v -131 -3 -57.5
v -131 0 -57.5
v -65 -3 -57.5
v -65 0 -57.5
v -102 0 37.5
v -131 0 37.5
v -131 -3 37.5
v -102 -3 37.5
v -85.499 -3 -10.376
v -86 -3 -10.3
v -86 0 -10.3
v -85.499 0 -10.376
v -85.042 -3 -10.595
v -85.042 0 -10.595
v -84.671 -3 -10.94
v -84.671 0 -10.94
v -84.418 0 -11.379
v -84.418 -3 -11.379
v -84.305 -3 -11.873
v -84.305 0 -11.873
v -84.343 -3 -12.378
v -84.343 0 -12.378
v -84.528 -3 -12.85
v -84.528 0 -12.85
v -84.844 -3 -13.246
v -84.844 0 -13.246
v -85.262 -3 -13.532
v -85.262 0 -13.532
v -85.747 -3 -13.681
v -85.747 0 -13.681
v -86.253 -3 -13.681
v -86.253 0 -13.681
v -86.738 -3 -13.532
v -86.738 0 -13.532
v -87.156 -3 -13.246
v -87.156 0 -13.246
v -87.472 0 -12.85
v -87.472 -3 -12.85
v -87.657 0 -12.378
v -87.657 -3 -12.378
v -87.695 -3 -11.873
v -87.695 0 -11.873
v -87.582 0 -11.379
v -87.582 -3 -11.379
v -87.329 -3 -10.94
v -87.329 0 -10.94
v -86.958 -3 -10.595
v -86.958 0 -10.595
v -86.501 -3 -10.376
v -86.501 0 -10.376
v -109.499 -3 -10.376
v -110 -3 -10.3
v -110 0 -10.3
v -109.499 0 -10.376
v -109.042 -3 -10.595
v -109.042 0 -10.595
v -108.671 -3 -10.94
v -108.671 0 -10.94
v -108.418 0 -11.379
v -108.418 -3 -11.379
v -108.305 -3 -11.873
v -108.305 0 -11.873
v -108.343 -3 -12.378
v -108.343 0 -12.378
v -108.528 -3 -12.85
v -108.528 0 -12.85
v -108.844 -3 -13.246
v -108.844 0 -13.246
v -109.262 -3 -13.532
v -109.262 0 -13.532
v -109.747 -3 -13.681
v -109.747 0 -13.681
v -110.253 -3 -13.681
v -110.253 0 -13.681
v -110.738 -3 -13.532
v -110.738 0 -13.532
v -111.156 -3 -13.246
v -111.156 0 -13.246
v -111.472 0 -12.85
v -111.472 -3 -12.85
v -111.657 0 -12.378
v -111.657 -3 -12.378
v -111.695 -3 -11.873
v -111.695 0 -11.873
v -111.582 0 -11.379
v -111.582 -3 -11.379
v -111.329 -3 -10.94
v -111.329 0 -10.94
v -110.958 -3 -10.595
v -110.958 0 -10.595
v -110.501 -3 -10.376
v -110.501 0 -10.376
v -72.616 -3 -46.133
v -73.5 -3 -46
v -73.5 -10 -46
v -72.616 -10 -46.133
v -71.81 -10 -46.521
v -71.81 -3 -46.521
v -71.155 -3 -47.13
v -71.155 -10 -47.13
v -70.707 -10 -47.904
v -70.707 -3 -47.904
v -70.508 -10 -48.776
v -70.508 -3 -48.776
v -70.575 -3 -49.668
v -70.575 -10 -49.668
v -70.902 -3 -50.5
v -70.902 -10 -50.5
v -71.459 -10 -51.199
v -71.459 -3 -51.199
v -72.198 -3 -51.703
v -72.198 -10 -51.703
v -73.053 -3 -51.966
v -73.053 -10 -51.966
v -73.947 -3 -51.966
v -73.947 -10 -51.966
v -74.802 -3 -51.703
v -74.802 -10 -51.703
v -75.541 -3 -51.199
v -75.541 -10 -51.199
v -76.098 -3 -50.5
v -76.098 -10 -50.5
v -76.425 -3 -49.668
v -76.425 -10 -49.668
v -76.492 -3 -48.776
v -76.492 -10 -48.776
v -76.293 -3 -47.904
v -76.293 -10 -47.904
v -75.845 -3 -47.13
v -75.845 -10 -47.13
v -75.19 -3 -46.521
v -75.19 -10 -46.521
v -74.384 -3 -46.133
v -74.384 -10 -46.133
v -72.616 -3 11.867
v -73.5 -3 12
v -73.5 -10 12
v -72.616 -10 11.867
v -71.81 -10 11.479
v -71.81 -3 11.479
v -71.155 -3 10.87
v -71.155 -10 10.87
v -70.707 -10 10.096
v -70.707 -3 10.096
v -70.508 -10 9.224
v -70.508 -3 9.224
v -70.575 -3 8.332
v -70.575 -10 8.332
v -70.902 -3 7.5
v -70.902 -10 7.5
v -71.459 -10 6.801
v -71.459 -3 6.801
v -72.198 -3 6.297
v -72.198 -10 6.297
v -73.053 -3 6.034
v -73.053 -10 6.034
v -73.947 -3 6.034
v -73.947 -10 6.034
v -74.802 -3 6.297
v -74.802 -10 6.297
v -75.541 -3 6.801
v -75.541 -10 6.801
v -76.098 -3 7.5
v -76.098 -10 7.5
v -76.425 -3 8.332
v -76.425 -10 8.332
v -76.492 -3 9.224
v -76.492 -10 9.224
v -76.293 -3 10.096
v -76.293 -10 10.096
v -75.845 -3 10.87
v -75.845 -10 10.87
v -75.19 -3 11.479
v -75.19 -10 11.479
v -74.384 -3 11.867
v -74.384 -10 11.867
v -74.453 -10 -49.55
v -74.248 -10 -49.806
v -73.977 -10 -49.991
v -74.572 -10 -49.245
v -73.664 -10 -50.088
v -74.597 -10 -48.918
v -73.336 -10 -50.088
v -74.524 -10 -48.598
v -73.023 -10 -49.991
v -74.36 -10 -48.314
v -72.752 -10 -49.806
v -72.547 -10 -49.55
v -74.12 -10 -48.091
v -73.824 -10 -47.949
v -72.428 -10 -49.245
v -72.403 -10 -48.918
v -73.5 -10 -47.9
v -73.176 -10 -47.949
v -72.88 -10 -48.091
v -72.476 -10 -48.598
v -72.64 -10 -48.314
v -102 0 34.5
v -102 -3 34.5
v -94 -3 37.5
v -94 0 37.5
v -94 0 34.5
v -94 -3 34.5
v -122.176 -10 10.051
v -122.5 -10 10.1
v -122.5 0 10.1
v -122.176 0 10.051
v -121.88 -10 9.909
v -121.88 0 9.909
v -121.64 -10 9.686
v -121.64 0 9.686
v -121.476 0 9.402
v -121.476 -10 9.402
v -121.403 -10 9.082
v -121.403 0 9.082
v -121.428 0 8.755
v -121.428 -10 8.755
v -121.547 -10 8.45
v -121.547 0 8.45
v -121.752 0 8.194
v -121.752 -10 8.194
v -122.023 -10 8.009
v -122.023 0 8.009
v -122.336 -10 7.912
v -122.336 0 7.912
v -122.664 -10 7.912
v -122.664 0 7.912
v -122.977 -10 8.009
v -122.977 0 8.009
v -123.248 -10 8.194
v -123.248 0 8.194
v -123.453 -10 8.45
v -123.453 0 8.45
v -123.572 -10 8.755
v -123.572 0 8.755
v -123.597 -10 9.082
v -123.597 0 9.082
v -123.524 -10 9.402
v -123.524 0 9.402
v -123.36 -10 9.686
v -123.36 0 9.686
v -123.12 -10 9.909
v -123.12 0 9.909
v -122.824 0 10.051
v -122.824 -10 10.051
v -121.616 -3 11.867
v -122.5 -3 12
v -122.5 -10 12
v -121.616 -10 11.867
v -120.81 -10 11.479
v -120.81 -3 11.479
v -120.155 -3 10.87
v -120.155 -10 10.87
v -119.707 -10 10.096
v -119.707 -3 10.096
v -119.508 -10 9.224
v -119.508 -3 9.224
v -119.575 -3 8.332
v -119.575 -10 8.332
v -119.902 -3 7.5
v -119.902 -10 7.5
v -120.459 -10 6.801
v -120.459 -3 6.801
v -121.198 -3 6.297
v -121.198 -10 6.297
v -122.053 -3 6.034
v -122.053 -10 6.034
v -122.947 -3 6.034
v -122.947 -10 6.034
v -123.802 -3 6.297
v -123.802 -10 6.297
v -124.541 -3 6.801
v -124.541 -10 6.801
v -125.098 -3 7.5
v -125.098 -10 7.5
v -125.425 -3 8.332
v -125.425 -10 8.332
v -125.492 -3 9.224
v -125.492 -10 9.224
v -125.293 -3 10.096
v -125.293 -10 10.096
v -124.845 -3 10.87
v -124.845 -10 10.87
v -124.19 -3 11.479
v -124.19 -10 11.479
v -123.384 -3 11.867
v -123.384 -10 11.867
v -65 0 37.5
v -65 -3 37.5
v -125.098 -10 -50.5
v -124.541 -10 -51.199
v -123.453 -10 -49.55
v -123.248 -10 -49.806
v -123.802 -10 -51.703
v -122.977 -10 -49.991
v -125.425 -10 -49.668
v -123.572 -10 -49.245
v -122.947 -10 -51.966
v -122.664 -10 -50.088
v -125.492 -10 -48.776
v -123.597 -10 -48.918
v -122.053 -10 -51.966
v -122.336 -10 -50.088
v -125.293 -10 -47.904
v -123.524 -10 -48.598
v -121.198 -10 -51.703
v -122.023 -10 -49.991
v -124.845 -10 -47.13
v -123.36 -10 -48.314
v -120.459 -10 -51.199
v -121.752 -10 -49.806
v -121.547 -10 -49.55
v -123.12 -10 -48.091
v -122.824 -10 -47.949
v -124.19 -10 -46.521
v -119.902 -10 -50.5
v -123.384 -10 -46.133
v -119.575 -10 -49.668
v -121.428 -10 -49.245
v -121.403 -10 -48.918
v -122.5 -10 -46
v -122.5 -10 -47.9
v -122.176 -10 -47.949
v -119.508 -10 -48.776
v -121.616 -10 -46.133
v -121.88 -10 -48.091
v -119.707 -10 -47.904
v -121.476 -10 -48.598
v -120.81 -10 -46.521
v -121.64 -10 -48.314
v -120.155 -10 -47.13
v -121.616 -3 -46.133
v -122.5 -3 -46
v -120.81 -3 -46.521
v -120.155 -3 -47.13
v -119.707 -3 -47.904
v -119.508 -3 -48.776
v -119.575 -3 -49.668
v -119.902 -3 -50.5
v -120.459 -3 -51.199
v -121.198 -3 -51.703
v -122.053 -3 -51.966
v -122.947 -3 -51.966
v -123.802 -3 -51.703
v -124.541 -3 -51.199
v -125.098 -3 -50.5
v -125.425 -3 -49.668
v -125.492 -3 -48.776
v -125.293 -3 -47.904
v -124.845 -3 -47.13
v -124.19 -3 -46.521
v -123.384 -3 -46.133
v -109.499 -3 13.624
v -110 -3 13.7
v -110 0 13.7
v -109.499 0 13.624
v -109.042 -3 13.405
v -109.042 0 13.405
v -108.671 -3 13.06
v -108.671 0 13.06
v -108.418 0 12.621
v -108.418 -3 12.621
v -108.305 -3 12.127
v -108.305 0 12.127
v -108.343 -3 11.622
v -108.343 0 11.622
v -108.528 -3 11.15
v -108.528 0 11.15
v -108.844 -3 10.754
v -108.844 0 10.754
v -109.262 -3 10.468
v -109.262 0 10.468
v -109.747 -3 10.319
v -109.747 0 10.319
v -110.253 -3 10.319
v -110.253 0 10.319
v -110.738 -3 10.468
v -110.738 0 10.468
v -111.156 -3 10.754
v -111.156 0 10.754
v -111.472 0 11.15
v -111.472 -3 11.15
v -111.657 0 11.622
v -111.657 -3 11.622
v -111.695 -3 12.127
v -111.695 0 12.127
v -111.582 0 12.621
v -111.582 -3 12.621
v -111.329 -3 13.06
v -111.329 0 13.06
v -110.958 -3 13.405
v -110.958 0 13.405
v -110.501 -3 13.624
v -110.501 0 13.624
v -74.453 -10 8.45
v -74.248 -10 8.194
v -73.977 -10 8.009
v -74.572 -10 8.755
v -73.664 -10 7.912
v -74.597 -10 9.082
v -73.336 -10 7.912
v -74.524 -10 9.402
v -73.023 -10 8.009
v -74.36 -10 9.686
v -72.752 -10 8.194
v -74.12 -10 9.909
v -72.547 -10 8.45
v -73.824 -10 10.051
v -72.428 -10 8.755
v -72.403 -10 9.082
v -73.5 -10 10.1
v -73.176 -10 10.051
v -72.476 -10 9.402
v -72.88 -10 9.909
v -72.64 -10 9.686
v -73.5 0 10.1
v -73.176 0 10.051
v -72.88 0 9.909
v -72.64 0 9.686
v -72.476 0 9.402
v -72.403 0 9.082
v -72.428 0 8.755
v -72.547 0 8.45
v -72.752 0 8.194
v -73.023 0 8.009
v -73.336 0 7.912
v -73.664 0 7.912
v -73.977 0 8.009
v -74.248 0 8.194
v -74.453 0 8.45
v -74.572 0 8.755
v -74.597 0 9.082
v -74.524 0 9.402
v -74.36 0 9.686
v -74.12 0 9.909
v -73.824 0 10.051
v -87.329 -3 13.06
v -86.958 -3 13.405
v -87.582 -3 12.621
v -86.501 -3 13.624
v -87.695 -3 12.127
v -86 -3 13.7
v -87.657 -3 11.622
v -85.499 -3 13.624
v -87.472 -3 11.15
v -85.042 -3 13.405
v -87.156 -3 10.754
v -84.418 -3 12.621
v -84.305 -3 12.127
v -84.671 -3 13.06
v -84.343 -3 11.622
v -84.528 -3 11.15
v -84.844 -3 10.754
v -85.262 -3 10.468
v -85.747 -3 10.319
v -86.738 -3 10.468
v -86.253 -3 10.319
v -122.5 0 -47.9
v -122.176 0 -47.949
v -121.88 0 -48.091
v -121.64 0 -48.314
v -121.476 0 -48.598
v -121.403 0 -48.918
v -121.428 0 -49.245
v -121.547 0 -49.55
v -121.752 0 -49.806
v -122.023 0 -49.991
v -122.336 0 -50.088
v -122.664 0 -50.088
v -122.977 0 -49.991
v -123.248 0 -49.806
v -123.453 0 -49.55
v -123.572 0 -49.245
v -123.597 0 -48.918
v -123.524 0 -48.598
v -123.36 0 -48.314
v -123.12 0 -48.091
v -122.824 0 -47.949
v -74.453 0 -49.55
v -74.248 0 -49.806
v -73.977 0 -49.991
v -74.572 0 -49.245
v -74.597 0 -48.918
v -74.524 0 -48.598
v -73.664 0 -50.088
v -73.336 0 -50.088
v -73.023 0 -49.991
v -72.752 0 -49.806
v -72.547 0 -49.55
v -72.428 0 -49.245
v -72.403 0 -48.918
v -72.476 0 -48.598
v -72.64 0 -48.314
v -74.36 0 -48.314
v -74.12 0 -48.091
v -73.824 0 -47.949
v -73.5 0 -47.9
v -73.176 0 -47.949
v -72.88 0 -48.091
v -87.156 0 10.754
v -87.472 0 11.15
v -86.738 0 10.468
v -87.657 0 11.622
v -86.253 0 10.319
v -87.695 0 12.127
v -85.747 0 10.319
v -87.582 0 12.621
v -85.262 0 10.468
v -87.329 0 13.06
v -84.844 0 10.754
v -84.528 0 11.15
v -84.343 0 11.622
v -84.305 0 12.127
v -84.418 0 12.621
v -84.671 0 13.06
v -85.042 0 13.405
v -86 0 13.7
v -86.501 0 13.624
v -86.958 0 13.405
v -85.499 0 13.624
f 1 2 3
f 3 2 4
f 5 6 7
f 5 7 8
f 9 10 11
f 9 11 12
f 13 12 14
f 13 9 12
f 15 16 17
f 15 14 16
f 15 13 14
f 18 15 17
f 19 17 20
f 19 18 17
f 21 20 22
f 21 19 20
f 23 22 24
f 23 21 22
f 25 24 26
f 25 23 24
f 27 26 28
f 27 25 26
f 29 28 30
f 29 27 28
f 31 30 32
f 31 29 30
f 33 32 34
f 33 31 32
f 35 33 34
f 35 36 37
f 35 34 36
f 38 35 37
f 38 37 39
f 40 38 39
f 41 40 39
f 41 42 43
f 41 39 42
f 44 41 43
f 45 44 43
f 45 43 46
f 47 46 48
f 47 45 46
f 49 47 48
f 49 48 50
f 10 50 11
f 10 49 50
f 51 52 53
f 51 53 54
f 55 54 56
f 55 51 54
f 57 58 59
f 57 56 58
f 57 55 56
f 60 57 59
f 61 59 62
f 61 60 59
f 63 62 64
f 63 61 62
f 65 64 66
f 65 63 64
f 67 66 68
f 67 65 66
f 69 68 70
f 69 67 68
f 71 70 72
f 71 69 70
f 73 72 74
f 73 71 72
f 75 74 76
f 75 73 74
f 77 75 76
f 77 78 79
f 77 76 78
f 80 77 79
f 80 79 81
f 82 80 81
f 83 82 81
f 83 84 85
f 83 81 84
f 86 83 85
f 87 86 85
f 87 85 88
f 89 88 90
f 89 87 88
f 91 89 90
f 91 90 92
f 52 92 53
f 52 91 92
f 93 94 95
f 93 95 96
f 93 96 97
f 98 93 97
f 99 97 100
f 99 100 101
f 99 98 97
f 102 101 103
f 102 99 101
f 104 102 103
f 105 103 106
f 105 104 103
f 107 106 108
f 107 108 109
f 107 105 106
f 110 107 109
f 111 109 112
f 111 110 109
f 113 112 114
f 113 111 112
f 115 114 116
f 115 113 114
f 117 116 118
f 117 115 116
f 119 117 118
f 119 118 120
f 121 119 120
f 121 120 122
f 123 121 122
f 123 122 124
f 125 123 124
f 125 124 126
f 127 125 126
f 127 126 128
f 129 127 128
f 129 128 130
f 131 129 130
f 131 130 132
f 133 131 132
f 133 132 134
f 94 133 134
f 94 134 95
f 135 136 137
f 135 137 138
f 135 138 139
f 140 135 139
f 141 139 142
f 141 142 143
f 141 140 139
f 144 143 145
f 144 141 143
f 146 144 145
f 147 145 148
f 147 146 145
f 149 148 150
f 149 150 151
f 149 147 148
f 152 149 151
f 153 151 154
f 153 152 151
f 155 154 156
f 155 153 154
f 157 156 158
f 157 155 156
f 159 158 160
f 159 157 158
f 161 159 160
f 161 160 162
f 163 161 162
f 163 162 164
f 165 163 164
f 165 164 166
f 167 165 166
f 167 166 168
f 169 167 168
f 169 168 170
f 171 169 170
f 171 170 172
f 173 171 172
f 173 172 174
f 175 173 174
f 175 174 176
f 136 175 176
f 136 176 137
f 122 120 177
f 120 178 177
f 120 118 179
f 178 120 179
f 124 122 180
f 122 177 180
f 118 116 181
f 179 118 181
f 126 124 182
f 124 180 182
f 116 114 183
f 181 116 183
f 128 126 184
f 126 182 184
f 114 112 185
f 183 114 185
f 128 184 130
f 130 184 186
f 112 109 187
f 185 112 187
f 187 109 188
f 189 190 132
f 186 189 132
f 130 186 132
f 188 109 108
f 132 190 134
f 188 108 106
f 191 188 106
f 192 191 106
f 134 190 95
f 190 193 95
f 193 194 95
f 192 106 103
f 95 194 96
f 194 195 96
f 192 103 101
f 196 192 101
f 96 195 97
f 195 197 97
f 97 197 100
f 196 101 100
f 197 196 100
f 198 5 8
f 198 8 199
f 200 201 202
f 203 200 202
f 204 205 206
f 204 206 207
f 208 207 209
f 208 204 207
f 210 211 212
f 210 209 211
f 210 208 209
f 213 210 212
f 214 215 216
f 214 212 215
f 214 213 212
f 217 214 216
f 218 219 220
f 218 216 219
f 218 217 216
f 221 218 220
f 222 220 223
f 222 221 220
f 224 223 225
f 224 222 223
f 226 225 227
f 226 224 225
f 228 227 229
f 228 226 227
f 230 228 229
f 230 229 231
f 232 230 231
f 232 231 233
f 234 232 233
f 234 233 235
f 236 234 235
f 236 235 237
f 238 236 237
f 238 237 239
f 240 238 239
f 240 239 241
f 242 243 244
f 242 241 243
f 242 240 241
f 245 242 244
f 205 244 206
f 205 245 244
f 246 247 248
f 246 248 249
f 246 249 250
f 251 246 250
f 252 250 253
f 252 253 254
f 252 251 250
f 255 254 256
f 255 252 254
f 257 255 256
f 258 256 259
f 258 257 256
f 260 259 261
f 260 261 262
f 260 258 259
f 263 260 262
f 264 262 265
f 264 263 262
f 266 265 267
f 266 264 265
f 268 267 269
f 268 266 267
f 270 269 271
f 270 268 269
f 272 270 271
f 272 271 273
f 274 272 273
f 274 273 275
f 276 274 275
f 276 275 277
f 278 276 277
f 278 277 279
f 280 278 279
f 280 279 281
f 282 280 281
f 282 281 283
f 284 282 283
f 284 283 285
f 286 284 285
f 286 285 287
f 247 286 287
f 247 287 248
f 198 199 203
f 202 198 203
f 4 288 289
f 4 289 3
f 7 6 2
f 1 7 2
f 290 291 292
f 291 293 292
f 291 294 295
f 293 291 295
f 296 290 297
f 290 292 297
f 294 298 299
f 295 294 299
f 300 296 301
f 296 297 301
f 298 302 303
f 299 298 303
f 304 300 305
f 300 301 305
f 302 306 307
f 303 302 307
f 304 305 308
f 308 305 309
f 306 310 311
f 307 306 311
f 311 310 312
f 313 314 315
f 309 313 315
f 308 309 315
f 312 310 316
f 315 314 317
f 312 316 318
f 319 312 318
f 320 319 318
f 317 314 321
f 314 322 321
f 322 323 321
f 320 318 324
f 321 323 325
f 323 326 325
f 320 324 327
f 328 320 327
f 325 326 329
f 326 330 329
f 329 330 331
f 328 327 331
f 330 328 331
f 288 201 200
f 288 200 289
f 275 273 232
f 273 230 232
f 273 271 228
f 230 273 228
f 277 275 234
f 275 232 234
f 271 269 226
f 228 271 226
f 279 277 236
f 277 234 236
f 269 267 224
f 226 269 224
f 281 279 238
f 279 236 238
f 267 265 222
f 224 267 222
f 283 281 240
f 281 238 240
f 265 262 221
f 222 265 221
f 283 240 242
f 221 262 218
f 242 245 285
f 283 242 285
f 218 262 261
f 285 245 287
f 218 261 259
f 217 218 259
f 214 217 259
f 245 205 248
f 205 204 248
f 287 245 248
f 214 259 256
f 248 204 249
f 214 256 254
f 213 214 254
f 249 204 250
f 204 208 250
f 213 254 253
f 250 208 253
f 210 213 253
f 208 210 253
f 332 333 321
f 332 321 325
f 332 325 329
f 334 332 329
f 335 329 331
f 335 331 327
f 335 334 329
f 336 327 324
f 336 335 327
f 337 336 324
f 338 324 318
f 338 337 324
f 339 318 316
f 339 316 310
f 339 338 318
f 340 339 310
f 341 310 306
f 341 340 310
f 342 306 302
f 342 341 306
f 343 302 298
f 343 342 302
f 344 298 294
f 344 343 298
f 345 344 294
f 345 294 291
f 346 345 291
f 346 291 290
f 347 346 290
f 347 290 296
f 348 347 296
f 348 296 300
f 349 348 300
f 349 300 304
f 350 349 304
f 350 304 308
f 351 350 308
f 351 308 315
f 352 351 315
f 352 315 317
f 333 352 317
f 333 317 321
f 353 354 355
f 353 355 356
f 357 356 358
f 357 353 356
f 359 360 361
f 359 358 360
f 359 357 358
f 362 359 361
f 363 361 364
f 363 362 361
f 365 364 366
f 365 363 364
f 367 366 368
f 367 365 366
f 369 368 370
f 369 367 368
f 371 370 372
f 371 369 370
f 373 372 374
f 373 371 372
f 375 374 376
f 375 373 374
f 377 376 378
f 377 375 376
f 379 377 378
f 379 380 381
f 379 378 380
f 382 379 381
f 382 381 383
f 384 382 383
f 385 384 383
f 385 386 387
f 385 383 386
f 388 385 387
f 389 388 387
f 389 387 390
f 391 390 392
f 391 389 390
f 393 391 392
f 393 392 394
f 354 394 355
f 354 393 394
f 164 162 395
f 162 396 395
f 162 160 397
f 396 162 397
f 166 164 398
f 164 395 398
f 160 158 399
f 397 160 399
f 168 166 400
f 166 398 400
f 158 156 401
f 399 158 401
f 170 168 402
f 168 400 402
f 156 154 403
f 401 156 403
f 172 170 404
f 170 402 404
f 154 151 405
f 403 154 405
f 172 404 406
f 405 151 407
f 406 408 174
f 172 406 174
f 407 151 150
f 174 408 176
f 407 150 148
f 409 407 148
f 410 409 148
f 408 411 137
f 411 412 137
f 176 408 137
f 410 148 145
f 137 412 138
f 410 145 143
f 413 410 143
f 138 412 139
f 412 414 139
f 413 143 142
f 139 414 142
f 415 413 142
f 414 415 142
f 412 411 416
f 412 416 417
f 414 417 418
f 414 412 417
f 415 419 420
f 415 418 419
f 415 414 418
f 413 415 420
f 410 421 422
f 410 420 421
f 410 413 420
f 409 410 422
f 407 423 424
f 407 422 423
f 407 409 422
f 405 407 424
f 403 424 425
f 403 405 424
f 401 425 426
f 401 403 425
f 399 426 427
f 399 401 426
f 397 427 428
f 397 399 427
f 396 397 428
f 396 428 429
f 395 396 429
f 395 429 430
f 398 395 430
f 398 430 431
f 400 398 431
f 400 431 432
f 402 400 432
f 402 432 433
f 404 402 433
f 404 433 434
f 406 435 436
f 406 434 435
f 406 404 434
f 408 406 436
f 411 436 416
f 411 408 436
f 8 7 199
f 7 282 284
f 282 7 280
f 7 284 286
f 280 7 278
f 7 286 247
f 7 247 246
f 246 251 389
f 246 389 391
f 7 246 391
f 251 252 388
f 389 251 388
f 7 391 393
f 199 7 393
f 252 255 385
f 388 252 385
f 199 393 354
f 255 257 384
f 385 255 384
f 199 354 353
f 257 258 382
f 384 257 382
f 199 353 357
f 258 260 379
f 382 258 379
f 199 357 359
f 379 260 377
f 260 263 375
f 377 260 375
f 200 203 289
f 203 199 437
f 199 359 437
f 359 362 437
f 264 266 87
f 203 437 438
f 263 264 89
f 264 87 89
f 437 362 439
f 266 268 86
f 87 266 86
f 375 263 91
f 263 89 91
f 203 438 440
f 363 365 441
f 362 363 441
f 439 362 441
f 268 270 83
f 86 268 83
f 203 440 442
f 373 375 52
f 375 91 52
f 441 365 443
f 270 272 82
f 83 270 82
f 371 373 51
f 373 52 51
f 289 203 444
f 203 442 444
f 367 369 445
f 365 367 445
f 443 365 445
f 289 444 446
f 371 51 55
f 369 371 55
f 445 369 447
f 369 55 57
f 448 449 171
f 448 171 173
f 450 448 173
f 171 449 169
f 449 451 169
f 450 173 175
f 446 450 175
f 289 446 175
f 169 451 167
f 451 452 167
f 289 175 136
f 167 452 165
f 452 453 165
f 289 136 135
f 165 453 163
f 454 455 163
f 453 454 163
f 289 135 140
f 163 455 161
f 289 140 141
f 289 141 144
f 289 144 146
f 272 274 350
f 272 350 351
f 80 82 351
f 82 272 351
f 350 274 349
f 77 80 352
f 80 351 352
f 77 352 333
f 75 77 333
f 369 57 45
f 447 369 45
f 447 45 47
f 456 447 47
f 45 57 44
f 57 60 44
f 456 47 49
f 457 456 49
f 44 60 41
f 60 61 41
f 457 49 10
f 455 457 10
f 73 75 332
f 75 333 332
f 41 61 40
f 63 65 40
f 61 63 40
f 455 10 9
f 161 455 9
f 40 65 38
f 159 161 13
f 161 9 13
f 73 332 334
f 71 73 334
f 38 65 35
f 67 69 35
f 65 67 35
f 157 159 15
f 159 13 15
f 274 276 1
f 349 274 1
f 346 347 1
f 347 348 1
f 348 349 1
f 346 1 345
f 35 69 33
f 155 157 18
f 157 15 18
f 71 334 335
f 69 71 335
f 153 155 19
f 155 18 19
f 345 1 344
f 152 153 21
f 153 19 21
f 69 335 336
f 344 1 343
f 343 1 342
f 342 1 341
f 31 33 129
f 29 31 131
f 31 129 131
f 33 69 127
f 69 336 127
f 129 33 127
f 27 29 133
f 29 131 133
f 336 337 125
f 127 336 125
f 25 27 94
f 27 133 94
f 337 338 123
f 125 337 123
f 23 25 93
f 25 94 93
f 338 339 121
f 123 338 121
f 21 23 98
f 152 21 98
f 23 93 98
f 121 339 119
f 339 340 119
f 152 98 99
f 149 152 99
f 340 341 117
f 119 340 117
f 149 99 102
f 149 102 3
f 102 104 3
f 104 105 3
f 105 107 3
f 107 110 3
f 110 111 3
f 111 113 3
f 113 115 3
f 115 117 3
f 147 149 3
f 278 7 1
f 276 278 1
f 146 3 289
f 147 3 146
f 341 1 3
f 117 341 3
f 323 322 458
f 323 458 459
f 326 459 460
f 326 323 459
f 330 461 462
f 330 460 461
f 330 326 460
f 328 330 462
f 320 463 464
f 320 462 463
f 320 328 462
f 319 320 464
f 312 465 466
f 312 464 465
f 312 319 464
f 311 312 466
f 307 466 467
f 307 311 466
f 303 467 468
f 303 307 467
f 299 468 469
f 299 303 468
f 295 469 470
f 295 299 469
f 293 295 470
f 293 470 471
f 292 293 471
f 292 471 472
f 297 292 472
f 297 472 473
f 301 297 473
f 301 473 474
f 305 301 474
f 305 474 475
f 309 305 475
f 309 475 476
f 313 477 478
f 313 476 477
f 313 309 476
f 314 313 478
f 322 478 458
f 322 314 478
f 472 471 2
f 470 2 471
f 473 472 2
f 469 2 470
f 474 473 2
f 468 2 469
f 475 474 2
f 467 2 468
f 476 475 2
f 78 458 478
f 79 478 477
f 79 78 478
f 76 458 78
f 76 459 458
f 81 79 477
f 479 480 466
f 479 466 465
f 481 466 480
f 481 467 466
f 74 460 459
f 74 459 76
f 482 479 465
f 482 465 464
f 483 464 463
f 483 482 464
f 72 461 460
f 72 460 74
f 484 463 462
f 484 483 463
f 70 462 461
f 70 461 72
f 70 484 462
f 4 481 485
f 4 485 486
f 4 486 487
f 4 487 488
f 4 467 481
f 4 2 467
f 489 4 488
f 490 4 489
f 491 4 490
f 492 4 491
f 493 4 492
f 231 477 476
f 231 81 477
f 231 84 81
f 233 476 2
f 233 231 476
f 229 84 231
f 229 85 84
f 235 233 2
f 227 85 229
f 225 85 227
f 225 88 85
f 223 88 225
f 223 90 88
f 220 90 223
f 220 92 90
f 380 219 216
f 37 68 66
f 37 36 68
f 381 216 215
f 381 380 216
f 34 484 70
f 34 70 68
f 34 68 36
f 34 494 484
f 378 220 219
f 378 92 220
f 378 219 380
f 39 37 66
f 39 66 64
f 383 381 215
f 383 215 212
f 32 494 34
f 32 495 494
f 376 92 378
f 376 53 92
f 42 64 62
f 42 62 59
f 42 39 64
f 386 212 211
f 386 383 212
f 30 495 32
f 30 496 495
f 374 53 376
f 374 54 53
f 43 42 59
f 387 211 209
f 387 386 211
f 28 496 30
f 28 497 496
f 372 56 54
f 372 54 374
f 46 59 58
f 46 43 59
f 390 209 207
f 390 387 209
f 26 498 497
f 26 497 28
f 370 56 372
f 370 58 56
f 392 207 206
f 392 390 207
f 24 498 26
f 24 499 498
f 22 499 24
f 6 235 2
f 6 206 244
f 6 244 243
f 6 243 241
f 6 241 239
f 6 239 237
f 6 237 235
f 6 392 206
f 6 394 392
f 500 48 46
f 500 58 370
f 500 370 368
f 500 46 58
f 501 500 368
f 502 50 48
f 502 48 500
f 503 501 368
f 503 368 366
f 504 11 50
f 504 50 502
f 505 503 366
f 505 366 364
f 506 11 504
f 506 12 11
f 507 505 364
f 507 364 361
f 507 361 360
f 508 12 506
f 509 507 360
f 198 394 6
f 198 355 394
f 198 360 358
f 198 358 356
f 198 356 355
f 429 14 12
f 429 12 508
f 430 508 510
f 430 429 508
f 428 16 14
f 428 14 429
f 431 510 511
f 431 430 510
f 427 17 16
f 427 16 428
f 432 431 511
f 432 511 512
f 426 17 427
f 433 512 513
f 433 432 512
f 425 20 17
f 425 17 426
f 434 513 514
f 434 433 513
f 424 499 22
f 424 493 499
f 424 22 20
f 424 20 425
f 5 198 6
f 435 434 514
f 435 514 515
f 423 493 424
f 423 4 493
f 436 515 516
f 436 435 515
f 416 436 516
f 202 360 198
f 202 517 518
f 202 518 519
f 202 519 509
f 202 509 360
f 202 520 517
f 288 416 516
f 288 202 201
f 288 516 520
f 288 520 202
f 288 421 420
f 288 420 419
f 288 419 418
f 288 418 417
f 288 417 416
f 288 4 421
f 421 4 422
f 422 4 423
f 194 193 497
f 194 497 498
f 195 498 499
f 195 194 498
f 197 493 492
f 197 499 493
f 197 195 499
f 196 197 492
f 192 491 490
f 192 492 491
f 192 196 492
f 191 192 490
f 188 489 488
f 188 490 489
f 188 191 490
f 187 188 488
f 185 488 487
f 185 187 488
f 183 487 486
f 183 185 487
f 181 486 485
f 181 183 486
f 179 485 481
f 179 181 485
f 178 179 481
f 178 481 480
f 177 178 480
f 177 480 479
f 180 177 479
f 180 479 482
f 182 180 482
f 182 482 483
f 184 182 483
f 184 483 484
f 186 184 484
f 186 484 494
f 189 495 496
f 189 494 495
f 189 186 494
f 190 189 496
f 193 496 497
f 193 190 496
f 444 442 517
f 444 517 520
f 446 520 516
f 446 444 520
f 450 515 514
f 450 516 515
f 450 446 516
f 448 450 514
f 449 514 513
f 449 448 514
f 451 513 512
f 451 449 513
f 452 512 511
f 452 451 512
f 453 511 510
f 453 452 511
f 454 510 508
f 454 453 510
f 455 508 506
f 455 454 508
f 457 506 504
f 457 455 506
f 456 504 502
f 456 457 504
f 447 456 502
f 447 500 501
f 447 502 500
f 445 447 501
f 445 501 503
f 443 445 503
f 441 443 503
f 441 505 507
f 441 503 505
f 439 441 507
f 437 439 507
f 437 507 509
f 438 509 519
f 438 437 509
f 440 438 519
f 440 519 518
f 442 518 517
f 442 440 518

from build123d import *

# Parameters (mm, degrees)
SKETCH1_W                       = 66
SKETCH1_H                       = 95
CRADLE_BASE_DEPTH               = 3
SKETCH2_R                       = 3
STANDOFFS_DEPTH                 = 10
PILOT_AND_BOLT_HOLES_DEPTH      = 144.412865532
PILOT_AND_BOLT_HOLES_DEPTH_BACK = 144.412865532
SKETCH3_R                       = 1.1
SKETCH3_R_2                     = 1.7
USB_END_NOTCH_DEPTH             = 144.412865532
USB_END_NOTCH_DEPTH_BACK        = 144.412865532
SKETCH4_W                       = 8
SKETCH4_H                       = 4


with BuildPart() as part:
    # Sketch1 → Cradle Base (new body)
    with BuildSketch(Plane(origin=(0, 0, 0), x_dir=(1, 0, 0), z_dir=(0, 1, 0))):
        with Locations((-98, 10)):
            Rectangle(SKETCH1_W, SKETCH1_H)
    extrude(amount=-CRADLE_BASE_DEPTH)

    # Sketch2 → Standoffs (add)
    with BuildSketch(Plane(origin=(0, 0, 0), x_dir=(1, 0, 0), z_dir=(0, 1, 0))):
        with Locations(Location((-122.5, 49, 0), (0, 0, 270))):
            Circle(SKETCH2_R)
        with Locations(Location((-122.5, -9, 0), (0, 0, 270))):
            Circle(SKETCH2_R)
        with Locations(Location((-73.5, 49, 0), (0, 0, 270))):
            Circle(SKETCH2_R)
        with Locations(Location((-73.5, -9, 0), (0, 0, 270))):
            Circle(SKETCH2_R)
    extrude(amount=-STANDOFFS_DEPTH)

    # Sketch3 → Pilot and Bolt Holes (cut, two sides: drawn at the far end of the back side and taken through both)
    with BuildSketch(Plane(origin=(0, 0, 0), x_dir=(1, 0, 0), z_dir=(0, 1, 0)).offset(-PILOT_AND_BOLT_HOLES_DEPTH_BACK)):
        with Locations(Location((-122.5, 49, 0), (0, 0, 270))):
            Circle(SKETCH3_R)
        with Locations(Location((-122.5, -9, 0), (0, 0, 270))):
            Circle(SKETCH3_R)
        with Locations(Location((-73.5, 49, 0), (0, 0, 270))):
            Circle(SKETCH3_R)
        with Locations(Location((-73.5, -9, 0), (0, 0, 270))):
            Circle(SKETCH3_R)
        with Locations(Location((-110, -12, 0), (0, 0, 270))):
            Circle(SKETCH3_R_2)
        with Locations(Location((-110, 12, 0), (0, 0, 270))):
            Circle(SKETCH3_R_2)
        with Locations(Location((-86, -12, 0), (0, 0, 270))):
            Circle(SKETCH3_R_2)
        with Locations(Location((-86, 12, 0), (0, 0, 270))):
            Circle(SKETCH3_R_2)
    extrude(amount=PILOT_AND_BOLT_HOLES_DEPTH + PILOT_AND_BOLT_HOLES_DEPTH_BACK, mode=Mode.SUBTRACT)

    # Sketch4 → USB End Notch (cut, two sides: drawn at the far end of the back side and taken through both)
    with BuildSketch(Plane(origin=(0, 0, 0), x_dir=(1, 0, 0), z_dir=(0, 1, 0)).offset(-USB_END_NOTCH_DEPTH_BACK)):
        with Locations((-98, -36.5)):
            Rectangle(SKETCH4_W, SKETCH4_H)
    extrude(amount=USB_END_NOTCH_DEPTH + USB_END_NOTCH_DEPTH_BACK, mode=Mode.SUBTRACT)


solid = part.part
